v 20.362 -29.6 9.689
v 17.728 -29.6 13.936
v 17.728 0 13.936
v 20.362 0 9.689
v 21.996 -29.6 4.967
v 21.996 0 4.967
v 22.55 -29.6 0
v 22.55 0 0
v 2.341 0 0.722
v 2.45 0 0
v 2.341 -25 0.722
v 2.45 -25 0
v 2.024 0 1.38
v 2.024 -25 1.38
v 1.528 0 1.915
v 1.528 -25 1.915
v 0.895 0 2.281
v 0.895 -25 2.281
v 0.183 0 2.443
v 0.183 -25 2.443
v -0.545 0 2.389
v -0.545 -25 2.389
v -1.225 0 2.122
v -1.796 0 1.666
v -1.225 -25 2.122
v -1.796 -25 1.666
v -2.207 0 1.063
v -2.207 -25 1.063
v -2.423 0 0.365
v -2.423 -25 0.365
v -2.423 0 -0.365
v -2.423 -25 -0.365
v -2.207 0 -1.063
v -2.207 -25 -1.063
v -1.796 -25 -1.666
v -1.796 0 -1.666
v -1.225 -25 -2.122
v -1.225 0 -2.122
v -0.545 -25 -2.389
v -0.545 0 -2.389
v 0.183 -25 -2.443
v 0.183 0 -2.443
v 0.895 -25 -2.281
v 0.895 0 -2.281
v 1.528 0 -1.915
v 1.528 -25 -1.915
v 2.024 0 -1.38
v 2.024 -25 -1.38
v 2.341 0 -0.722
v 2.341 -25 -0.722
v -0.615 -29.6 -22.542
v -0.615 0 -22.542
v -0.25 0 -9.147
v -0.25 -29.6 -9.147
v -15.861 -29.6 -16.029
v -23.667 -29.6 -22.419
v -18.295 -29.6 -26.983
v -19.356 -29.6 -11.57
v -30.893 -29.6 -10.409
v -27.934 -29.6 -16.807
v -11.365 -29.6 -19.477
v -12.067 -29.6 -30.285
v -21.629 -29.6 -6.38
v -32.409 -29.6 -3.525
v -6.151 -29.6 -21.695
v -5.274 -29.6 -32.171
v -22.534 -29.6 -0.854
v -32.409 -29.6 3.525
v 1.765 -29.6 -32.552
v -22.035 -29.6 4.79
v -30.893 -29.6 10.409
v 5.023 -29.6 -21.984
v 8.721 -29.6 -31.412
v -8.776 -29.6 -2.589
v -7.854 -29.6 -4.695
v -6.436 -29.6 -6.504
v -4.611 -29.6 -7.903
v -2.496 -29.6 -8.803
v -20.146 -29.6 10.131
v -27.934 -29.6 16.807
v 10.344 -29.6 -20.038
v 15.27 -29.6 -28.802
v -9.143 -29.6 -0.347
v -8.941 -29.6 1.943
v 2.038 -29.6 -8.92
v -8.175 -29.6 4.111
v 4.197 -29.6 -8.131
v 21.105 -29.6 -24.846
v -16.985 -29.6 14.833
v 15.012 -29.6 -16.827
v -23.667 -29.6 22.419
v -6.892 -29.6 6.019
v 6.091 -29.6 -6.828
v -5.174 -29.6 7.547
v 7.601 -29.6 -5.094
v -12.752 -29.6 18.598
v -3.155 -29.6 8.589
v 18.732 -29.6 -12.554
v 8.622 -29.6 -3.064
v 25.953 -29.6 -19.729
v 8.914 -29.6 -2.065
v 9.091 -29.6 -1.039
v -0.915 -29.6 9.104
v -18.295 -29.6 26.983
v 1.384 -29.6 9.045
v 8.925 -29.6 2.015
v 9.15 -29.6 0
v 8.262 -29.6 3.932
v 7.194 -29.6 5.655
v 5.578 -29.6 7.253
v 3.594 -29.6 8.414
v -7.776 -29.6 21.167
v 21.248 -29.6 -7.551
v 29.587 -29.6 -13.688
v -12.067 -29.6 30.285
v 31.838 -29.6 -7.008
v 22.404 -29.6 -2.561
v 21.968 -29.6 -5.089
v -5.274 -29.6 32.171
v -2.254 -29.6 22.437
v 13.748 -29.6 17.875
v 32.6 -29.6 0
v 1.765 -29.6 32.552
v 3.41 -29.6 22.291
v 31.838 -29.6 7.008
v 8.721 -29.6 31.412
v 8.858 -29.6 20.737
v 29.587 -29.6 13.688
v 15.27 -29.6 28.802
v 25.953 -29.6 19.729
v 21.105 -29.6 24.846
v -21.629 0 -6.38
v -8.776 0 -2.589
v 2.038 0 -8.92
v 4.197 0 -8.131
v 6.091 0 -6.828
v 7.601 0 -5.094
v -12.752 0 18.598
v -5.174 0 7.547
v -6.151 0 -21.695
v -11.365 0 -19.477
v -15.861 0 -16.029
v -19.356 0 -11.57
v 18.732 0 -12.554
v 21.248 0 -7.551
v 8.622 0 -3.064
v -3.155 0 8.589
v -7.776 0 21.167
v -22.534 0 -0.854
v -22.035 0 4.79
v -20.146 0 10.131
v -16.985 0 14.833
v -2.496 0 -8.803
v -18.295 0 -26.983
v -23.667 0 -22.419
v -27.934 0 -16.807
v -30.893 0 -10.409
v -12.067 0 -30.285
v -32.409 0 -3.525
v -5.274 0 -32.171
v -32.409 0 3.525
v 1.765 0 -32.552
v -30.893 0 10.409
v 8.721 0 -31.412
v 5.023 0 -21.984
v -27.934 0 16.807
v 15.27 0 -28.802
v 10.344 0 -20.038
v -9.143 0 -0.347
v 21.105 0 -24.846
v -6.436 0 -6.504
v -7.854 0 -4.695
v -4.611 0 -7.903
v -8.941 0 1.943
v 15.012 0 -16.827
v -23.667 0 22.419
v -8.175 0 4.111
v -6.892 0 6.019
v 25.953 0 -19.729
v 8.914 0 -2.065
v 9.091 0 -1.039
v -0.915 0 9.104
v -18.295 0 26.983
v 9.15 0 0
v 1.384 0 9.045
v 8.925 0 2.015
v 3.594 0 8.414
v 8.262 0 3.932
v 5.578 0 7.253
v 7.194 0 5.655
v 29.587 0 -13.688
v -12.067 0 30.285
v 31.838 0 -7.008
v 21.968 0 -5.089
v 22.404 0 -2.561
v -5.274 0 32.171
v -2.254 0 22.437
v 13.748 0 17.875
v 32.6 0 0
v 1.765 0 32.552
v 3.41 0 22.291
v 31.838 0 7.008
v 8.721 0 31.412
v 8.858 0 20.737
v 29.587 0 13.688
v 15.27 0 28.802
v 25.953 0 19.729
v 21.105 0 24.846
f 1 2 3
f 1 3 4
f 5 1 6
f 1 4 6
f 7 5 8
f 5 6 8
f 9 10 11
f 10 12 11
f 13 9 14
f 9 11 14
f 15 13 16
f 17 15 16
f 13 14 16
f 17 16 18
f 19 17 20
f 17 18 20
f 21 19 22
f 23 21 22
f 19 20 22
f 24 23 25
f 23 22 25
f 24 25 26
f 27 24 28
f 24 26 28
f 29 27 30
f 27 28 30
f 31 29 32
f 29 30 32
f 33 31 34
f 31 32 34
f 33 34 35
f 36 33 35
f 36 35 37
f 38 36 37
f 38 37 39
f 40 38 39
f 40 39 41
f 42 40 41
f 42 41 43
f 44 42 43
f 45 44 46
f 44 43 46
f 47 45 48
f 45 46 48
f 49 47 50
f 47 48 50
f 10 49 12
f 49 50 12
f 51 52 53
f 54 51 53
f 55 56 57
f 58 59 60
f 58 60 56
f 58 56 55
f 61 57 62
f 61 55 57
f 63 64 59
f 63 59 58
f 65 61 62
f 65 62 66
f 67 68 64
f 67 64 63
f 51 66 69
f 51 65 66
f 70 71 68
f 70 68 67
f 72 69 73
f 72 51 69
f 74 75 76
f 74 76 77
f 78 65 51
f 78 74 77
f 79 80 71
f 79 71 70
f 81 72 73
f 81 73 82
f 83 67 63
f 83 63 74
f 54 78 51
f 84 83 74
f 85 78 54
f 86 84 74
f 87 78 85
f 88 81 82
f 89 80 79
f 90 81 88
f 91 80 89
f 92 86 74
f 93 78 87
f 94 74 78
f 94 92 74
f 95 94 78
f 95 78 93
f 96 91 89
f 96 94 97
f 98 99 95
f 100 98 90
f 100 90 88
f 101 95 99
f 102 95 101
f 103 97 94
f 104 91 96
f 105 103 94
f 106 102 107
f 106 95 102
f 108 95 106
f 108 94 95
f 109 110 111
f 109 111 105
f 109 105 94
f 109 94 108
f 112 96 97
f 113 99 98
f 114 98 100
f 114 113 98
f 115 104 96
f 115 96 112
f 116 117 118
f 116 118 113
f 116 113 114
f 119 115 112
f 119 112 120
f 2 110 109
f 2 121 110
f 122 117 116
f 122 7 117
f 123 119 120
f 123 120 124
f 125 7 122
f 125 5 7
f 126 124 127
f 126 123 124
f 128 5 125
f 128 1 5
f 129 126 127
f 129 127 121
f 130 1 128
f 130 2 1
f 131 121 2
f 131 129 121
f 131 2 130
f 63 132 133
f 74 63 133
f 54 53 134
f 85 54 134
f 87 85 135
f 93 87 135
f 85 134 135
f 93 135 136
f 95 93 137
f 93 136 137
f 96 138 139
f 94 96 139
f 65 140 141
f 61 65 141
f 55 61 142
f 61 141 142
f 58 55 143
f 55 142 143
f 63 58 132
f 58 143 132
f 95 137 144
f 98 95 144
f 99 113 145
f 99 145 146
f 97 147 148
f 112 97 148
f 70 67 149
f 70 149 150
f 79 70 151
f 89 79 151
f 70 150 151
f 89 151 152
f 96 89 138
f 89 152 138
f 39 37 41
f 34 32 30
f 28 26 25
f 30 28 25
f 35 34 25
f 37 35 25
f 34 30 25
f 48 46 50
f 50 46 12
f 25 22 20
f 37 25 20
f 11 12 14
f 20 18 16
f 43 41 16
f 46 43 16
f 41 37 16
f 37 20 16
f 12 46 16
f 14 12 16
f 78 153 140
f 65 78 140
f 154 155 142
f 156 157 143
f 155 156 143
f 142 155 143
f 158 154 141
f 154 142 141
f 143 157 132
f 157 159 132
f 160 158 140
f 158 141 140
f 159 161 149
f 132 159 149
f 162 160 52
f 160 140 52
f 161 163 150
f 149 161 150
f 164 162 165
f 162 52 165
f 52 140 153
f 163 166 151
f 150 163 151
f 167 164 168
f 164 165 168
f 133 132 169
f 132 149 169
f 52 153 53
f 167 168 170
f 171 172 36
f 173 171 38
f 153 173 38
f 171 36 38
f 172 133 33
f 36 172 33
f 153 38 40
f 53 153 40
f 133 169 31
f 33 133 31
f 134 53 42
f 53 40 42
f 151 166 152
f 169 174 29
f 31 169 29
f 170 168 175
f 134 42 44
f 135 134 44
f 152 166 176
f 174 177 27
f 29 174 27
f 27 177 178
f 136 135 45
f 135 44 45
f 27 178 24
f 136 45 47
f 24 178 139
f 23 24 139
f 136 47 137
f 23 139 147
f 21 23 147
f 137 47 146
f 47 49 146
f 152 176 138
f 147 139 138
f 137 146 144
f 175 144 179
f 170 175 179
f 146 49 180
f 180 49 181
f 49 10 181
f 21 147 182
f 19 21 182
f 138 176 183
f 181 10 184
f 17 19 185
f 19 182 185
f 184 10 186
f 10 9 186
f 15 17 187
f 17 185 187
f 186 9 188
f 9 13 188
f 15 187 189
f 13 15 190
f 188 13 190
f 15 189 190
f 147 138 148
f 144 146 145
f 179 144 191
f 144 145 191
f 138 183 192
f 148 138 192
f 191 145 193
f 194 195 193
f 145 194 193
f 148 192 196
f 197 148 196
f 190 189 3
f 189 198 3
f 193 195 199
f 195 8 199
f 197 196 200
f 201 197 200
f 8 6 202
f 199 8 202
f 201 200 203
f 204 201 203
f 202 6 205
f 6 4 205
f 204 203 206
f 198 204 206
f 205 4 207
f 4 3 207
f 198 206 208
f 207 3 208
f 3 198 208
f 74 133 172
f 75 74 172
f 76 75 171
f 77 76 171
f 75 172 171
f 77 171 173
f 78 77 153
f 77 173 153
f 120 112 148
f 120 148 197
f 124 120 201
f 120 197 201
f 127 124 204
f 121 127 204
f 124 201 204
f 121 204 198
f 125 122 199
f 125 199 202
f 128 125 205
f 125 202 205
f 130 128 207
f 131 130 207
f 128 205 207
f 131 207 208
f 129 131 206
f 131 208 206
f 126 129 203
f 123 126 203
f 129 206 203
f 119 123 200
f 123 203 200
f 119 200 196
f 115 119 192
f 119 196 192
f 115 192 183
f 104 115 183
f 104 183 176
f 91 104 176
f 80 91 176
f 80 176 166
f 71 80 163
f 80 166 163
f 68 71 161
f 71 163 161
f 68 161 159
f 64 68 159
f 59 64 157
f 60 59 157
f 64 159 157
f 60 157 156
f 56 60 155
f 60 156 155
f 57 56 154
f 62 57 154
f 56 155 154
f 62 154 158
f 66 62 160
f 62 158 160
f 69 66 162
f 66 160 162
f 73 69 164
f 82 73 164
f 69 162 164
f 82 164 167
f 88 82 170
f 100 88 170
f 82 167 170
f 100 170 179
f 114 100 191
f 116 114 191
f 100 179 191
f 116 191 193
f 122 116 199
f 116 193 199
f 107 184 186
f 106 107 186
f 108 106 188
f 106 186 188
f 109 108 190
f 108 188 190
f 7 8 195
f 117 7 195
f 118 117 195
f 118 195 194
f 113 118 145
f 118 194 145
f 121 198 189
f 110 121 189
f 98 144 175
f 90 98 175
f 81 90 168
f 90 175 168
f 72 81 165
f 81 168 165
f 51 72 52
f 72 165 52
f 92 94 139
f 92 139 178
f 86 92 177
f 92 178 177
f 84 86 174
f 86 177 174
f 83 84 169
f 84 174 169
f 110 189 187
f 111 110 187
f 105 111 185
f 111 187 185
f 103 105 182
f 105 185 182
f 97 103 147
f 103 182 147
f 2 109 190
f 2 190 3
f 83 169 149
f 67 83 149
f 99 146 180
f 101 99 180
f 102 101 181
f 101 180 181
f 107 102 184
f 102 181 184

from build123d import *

# Parameters (mm, degrees)
F0_R     = 32.6
F0_R_2   = 4.75
F1_DEPTH = 29.6
F2_R     = 2.45
F3_DEPTH = 25


with BuildPart() as f1:
    # F0 (on Front) → F1 (new body)
    with BuildSketch(Plane.XZ):
        Circle(F0_R)
        with BuildLine():
            ThreePointArc((13.747567, 17.874756), (15.860659, 16.029411), (17.728264, 13.935967))
            ThreePointArc((17.728264, 13.935967), (21.3105, 7.373268), (22.55, 0))
            ThreePointArc((22.55, 0), (22.22215, -3.831257), (21.248135, -7.55111))
            ThreePointArc((21.248135, -7.55111), (20.146089, -10.131023), (18.732227, -12.55413))
            ThreePointArc((18.732227, -12.55413), (10.343662, -20.037743), (-0.615498, -22.541598))
            ThreePointArc((-0.615498, -22.541598), (-3.409691, -22.290727), (-6.151111, -21.694846))
            ThreePointArc((-6.151111, -21.694846), (-15.860659, -16.029411), (-21.628533, -6.380364))
            ThreePointArc((-21.628533, -6.380364), (-22.253394, -3.645404), (-22.533822, -0.854022))
            ThreePointArc((-22.533822, -0.854022), (-20.146089, 10.131023), (-12.751671, 18.598317))
            ThreePointArc((-12.751671, 18.598317), (-10.343662, 20.037743), (-7.775557, 21.167031))
            ThreePointArc((-7.775557, 21.167031), (3.409691, 22.290727), (13.747567, 17.874756))
        make_face(mode=Mode.SUBTRACT)
        with BuildLine():
            ThreePointArc((-5.174181, 7.546545), (-4.197096, 8.130614), (-3.155049, 8.58884))
            Line((-3.155049, 8.58884), (-7.775557, 21.167031))
            ThreePointArc((-7.775557, 21.167031), (-10.343662, 20.037743), (-12.751671, 18.598317))
            Line((-12.751671, 18.598317), (-5.174181, 7.546545))
        make_face()
        with BuildLine():
            ThreePointArc((5.578281, 7.25295), (6.4357, 6.504173), (7.193508, 5.654727))
            Line((7.193508, 5.654727), (17.728264, 13.935967))
            ThreePointArc((17.728264, 13.935967), (15.860659, 16.029411), (13.747567, 17.874756))
            Line((13.747567, 17.874756), (5.578281, 7.25295))
        make_face()
        with BuildLine():
            Line((21.248135, -7.55111), (8.621749, -3.063976))
            ThreePointArc((8.621749, -3.063976), (8.174577, -4.110814), (7.600881, -5.094026))
            Line((7.600881, -5.094026), (18.732227, -12.55413))
            ThreePointArc((18.732227, -12.55413), (20.146089, -10.131023), (21.248135, -7.55111))
        make_face()
        with BuildLine():
            Line((-0.615498, -22.541598), (-0.249747, -9.146591))
            ThreePointArc((-0.249747, -9.146591), (-1.383533, -9.044796), (-2.495905, -8.803008))
            Line((-2.495905, -8.803008), (-6.151111, -21.694846))
            ThreePointArc((-6.151111, -21.694846), (-3.409691, -22.290727), (-0.615498, -22.541598))
        make_face()
        with BuildLine():
            ThreePointArc((-8.776101, -2.588928), (-9.029648, -1.479177), (-9.143436, -0.346532))
            Line((-9.143436, -0.346532), (-22.533822, -0.854022))
            ThreePointArc((-22.533822, -0.854022), (-22.253394, -3.645404), (-21.628533, -6.380364))
            Line((-21.628533, -6.380364), (-8.776101, -2.588928))
        make_face()
        with BuildLine():
            ThreePointArc((8.621749, -3.063976), (9.01697, -1.55459), (9.15, 0))
            ThreePointArc((9.15, 0), (8.647054, 2.991814), (7.193508, 5.654727))
            ThreePointArc((7.193508, 5.654727), (6.4357, 6.504173), (5.578281, 7.25295))
            ThreePointArc((5.578281, 7.25295), (1.383533, 9.044796), (-3.155049, 8.58884))
            ThreePointArc((-3.155049, 8.58884), (-4.197096, 8.130614), (-5.174181, 7.546545))
            ThreePointArc((-5.174181, 7.546545), (-8.174577, 4.110814), (-9.143436, -0.346532))
            ThreePointArc((-9.143436, -0.346532), (-9.029648, -1.479177), (-8.776101, -2.588928))
            ThreePointArc((-8.776101, -2.588928), (-6.4357, -6.504173), (-2.495905, -8.803008))
            ThreePointArc((-2.495905, -8.803008), (-1.383533, -9.044796), (-0.249747, -9.146591))
            ThreePointArc((-0.249747, -9.146591), (4.197096, -8.130614), (7.600881, -5.094026))
            ThreePointArc((7.600881, -5.094026), (8.174577, -4.110814), (8.621749, -3.063976))
        make_face()
        Circle(F0_R_2, mode=Mode.SUBTRACT)
        Circle(F0_R_2)
    extrude(amount=F1_DEPTH)

    # F2 (on Front) → F3 (cut, symmetric)
    with BuildSketch(Plane.XZ):
        Circle(F2_R)
    extrude(amount=F3_DEPTH, both=True, mode=Mode.SUBTRACT)


solid = f1.part
